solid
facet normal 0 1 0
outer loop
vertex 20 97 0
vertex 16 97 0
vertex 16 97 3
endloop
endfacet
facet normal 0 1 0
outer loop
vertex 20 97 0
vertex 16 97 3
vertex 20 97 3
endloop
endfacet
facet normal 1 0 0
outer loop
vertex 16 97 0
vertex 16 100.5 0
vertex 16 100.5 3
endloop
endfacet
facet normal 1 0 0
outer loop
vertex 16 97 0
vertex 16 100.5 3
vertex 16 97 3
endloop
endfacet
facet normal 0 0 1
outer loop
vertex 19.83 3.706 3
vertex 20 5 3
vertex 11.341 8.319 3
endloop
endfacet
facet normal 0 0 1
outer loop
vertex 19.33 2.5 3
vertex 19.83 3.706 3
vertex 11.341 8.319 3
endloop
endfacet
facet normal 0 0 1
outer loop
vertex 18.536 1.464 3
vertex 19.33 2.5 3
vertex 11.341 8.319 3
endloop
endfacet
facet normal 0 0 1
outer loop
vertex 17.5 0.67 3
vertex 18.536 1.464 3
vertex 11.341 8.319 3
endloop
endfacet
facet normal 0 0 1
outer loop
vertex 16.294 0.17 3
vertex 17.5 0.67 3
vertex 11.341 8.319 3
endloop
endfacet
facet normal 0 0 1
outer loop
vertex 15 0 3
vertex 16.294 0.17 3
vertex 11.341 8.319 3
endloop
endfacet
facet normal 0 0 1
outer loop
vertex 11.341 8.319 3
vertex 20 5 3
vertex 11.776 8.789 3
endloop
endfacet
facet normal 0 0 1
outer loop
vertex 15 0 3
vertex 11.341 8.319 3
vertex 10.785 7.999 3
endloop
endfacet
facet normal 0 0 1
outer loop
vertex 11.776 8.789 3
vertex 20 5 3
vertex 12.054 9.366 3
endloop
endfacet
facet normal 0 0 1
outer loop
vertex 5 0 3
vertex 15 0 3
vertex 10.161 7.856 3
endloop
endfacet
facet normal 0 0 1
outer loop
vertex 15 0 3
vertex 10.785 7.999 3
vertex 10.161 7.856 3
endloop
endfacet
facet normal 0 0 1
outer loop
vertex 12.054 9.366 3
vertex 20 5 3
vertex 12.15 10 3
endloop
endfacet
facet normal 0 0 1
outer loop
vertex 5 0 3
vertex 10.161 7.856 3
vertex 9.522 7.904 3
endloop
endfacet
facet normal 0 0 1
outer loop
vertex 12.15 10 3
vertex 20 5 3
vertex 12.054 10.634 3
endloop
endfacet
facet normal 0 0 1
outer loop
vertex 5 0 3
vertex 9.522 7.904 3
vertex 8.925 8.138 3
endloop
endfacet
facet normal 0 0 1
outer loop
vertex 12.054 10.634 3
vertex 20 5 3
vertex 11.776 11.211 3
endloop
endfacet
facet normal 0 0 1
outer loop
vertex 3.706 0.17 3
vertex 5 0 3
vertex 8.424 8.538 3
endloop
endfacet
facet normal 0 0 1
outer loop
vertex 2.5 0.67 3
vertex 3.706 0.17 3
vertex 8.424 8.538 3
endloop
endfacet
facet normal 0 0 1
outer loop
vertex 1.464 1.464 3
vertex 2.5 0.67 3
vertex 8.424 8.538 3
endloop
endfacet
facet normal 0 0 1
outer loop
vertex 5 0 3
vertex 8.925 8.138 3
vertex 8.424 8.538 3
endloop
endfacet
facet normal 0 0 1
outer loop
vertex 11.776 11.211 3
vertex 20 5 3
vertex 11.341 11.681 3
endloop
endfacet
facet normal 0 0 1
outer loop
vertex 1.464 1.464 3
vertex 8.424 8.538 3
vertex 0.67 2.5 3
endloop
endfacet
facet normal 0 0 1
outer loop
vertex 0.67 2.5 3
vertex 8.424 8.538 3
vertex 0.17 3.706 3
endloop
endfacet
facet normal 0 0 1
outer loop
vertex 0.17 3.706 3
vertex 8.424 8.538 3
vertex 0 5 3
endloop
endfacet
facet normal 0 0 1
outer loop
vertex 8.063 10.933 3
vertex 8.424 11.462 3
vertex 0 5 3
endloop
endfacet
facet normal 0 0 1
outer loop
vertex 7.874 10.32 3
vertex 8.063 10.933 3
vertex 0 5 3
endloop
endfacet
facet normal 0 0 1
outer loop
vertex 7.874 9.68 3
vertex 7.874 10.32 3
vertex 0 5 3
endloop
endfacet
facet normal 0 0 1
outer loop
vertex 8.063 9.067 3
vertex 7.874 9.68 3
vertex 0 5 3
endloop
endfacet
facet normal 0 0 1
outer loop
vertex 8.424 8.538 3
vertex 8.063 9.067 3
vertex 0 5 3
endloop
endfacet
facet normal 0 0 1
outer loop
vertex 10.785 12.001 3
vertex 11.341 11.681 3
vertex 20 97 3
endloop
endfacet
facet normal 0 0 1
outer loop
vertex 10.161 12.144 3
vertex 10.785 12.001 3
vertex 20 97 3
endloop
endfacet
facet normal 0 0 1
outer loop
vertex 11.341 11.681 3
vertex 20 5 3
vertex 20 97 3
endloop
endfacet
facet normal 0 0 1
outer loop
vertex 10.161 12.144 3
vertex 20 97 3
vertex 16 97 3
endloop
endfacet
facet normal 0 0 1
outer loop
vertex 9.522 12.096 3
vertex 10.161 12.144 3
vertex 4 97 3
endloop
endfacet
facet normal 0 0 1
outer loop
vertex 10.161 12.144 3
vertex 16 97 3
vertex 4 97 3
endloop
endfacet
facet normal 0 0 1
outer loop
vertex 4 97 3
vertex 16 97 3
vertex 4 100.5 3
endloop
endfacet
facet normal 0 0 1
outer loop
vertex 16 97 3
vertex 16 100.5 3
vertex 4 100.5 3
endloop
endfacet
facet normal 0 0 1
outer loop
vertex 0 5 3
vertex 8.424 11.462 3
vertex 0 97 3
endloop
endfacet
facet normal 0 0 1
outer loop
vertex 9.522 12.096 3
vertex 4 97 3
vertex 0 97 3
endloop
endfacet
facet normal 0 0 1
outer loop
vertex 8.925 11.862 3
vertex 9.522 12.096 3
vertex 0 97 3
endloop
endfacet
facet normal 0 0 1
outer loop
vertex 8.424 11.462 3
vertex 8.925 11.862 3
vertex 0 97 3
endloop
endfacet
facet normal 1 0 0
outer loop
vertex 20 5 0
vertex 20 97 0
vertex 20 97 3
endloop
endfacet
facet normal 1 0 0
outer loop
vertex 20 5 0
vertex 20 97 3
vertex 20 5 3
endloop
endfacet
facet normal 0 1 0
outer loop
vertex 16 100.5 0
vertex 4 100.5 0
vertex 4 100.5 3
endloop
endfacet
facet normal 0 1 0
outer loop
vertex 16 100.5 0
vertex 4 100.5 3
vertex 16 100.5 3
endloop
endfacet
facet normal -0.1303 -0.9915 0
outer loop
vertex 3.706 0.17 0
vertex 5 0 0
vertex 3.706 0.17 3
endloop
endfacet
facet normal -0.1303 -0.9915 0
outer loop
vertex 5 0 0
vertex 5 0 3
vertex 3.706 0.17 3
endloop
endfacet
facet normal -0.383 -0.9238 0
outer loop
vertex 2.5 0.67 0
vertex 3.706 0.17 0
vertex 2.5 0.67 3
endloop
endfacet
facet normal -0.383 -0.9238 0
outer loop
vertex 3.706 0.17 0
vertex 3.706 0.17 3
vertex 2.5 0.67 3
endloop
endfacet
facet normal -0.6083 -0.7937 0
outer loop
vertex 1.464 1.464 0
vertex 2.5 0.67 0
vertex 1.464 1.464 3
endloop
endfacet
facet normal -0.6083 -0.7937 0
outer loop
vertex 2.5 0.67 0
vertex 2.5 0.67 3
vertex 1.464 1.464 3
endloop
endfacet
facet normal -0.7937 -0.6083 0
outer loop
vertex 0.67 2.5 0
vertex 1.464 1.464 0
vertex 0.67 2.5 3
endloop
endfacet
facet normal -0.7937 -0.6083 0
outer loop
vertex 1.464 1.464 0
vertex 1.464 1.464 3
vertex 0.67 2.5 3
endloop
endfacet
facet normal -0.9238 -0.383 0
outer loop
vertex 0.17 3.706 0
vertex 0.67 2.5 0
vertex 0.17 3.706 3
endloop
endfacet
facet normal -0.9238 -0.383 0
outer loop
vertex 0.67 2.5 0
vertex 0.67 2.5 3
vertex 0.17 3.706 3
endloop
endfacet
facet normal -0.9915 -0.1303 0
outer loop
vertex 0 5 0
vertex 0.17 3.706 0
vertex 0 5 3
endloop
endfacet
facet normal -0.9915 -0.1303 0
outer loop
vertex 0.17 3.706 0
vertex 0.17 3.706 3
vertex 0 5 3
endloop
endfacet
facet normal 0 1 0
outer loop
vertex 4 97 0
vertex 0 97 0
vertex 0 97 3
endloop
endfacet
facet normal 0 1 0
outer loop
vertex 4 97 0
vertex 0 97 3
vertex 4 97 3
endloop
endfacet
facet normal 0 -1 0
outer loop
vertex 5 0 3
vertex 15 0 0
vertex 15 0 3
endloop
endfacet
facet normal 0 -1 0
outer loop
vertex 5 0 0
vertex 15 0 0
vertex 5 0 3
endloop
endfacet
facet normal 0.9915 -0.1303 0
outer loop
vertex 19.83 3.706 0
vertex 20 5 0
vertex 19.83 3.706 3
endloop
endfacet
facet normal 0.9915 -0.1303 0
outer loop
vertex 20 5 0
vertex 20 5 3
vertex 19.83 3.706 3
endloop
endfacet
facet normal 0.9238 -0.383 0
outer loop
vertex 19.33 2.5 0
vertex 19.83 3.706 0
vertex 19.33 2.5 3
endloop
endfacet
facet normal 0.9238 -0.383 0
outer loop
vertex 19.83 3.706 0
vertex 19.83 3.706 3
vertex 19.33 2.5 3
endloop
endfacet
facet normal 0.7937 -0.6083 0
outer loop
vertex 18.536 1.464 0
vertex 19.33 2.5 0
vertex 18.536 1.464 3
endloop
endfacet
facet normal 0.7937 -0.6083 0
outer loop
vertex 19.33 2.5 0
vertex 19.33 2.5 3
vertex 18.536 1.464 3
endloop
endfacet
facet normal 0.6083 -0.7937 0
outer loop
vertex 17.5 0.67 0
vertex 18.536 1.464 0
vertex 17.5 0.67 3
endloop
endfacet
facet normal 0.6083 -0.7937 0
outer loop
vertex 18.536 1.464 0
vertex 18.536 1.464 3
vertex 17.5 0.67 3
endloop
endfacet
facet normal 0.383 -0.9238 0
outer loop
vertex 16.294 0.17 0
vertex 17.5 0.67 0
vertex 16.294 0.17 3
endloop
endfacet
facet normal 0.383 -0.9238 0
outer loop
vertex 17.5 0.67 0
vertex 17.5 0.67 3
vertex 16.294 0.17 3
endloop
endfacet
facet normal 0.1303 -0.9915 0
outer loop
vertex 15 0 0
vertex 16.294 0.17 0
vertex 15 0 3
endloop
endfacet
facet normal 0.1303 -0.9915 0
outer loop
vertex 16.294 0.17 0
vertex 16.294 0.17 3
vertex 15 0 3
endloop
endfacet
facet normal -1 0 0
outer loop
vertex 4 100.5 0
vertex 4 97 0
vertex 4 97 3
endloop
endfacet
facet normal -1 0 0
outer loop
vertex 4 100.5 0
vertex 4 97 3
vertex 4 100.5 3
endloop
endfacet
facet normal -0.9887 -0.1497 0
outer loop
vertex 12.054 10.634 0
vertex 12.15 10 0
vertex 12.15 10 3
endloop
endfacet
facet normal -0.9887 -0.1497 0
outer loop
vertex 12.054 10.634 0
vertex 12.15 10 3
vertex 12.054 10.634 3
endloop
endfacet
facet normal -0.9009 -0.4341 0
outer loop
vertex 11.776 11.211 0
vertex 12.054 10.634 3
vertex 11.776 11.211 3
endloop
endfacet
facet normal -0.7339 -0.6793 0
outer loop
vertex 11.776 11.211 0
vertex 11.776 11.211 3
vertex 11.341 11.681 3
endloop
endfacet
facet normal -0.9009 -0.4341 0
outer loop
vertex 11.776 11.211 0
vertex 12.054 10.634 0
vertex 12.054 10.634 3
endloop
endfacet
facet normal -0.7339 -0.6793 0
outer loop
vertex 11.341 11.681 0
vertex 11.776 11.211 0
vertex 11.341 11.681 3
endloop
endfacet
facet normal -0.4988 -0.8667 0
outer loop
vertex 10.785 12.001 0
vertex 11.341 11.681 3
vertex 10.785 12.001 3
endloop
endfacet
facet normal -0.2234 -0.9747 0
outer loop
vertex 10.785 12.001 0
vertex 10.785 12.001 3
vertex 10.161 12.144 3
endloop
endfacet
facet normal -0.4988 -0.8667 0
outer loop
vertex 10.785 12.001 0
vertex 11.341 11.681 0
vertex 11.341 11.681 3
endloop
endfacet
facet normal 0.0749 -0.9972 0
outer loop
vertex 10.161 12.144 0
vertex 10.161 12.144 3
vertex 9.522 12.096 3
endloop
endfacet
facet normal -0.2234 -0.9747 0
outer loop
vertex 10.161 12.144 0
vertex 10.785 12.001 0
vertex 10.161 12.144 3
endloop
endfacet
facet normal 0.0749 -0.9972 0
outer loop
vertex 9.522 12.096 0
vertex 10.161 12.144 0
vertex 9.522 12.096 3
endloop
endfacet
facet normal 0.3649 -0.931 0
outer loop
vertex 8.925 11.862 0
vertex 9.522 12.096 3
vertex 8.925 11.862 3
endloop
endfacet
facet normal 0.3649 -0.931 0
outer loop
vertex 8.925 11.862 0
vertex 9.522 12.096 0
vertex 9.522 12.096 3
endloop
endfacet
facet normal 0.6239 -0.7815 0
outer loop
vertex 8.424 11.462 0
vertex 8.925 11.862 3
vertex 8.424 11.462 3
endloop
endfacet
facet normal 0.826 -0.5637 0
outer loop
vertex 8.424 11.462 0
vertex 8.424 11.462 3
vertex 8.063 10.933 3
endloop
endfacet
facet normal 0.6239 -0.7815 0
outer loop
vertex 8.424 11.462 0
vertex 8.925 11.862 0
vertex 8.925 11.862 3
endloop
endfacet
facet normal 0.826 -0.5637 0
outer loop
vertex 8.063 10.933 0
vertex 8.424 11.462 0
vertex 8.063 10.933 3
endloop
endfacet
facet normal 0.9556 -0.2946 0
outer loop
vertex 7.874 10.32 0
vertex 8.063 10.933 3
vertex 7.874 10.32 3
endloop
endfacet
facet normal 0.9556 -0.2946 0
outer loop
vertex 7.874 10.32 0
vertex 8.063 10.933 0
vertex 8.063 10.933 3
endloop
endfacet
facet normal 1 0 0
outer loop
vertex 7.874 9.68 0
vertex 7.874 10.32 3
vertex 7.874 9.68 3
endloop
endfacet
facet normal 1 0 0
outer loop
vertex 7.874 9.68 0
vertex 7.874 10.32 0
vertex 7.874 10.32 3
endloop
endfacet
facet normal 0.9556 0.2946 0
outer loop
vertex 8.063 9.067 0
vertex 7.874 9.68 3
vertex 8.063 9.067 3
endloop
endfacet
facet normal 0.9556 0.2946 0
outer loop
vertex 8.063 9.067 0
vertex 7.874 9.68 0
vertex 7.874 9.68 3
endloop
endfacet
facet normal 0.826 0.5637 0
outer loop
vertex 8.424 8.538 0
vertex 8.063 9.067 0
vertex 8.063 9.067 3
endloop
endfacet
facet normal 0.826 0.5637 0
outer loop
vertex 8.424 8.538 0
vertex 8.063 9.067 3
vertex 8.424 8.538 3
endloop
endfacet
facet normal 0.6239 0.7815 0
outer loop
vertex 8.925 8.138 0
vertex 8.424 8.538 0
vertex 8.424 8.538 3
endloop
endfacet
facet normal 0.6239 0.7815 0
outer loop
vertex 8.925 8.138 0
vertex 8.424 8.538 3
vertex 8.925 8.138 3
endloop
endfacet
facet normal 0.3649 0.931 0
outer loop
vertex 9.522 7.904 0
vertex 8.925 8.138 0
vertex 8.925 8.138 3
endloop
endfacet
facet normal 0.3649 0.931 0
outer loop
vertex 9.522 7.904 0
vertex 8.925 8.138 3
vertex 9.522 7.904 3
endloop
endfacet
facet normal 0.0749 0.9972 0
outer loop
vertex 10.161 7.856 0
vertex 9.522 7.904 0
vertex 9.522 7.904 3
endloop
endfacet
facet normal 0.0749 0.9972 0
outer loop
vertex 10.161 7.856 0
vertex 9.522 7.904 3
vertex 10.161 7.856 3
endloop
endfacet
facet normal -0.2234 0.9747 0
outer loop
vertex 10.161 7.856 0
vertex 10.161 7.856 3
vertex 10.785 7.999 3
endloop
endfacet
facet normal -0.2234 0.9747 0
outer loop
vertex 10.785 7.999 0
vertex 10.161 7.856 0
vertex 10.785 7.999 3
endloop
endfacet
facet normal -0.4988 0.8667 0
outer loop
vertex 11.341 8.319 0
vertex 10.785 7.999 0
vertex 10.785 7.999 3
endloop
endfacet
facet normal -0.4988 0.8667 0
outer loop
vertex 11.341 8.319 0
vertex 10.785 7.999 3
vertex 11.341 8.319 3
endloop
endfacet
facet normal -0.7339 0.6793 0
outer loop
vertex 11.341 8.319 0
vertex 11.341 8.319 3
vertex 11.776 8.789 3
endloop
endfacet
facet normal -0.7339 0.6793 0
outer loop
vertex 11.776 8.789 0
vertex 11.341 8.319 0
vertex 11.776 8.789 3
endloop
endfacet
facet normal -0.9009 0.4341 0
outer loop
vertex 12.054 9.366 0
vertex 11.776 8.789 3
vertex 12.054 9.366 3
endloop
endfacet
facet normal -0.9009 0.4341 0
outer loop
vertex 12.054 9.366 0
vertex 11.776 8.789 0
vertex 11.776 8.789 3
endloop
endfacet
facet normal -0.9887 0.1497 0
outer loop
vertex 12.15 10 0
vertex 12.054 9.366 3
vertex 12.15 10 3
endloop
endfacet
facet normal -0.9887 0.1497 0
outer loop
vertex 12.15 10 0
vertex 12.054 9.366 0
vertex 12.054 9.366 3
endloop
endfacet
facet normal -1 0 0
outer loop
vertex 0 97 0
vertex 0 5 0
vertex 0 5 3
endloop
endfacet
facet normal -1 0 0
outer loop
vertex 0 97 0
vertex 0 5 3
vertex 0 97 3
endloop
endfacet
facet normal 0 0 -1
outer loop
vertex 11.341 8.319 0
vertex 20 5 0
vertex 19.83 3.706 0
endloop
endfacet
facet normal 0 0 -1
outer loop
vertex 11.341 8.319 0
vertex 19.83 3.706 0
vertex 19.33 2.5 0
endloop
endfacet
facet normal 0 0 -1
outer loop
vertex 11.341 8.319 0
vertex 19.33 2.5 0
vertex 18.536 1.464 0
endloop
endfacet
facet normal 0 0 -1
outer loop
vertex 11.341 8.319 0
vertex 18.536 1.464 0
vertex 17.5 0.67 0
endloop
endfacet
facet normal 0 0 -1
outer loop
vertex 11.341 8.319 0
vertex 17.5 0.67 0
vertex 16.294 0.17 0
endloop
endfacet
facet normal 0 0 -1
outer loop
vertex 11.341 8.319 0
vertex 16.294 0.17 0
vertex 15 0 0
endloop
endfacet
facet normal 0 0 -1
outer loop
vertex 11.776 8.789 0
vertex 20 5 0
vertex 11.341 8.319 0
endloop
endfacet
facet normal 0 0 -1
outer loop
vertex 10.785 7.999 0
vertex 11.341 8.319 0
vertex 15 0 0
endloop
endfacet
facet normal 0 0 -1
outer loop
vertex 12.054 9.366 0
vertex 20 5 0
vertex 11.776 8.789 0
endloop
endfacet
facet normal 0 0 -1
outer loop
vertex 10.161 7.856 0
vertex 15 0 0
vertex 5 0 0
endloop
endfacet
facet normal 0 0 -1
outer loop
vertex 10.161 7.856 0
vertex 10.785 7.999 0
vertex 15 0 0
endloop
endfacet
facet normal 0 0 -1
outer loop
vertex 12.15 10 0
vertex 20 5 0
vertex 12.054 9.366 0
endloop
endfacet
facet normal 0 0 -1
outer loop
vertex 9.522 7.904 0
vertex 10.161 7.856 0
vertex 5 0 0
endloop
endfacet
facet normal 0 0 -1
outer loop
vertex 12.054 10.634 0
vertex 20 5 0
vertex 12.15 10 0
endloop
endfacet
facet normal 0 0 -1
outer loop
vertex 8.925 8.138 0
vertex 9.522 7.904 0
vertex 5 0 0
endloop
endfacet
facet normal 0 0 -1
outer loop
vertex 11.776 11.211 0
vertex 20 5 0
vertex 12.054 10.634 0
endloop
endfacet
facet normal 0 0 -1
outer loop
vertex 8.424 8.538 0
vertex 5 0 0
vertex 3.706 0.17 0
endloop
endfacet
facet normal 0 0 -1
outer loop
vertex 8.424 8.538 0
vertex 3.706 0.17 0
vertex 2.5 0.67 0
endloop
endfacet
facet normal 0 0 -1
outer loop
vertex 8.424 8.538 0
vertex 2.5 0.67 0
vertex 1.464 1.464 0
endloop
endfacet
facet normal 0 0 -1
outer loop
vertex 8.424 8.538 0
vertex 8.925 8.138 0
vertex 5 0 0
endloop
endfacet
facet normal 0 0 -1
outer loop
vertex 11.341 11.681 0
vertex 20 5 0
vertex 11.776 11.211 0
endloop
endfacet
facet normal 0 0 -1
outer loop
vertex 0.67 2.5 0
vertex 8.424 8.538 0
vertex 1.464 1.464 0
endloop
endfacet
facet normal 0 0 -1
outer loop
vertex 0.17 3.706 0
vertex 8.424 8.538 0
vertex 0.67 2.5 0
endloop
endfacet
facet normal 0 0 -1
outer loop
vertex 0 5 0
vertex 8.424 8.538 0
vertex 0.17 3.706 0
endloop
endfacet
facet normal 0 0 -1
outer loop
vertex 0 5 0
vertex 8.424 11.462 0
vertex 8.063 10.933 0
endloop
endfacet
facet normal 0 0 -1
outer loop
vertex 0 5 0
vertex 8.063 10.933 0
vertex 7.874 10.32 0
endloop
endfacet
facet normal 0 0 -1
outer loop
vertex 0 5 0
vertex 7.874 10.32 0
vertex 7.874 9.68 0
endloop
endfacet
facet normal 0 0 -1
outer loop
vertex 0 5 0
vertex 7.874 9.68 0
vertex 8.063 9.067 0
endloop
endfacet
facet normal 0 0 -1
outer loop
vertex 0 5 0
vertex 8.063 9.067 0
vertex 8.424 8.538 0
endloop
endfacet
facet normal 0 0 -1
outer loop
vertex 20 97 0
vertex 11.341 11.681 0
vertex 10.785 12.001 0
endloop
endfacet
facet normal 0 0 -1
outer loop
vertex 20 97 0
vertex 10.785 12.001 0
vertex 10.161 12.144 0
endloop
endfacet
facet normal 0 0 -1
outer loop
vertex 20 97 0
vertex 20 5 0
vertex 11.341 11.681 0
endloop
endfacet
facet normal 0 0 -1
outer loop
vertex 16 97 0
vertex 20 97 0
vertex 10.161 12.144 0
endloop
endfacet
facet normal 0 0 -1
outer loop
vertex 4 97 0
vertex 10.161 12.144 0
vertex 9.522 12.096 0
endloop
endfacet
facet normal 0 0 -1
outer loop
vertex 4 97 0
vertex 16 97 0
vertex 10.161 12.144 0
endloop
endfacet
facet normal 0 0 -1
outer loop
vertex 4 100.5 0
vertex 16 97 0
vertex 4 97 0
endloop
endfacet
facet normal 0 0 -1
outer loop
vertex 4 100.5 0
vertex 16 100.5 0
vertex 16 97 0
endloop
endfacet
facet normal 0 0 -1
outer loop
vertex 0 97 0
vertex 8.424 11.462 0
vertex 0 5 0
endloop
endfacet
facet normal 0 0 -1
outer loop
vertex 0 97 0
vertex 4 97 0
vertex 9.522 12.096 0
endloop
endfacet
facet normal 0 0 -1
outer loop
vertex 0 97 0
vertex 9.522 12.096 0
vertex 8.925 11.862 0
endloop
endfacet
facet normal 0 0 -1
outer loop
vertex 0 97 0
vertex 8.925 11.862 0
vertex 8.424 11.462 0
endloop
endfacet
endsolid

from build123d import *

# Parameters (mm, degrees)
SKETCH_1_R      = 2.15
EXTRUDE_1_DEPTH = 3
FILLET_1_R      = 5


with BuildPart() as part:
    # 草图1 → 凸台-拉伸1 (new body)
    with BuildSketch(Plane.XY):
        Polygon((16, 97), (20, 97), (20, 0), (0, 0), (0, 97), (4, 97), (4, 100.5), (16, 100.5), align=None)
        with Locations((10, 10)):
            Circle(SKETCH_1_R, mode=Mode.SUBTRACT)
    extrude(amount=EXTRUDE_1_DEPTH)

    # 圆角1
    fillet_1_edges = [part.edges().sort_by_distance(p)[0] for p in [
        (20, 0, 1.5),
        (0, 0, 1.5),
    ]]
    fillet(fillet_1_edges, radius=FILLET_1_R)


solid = part.part
